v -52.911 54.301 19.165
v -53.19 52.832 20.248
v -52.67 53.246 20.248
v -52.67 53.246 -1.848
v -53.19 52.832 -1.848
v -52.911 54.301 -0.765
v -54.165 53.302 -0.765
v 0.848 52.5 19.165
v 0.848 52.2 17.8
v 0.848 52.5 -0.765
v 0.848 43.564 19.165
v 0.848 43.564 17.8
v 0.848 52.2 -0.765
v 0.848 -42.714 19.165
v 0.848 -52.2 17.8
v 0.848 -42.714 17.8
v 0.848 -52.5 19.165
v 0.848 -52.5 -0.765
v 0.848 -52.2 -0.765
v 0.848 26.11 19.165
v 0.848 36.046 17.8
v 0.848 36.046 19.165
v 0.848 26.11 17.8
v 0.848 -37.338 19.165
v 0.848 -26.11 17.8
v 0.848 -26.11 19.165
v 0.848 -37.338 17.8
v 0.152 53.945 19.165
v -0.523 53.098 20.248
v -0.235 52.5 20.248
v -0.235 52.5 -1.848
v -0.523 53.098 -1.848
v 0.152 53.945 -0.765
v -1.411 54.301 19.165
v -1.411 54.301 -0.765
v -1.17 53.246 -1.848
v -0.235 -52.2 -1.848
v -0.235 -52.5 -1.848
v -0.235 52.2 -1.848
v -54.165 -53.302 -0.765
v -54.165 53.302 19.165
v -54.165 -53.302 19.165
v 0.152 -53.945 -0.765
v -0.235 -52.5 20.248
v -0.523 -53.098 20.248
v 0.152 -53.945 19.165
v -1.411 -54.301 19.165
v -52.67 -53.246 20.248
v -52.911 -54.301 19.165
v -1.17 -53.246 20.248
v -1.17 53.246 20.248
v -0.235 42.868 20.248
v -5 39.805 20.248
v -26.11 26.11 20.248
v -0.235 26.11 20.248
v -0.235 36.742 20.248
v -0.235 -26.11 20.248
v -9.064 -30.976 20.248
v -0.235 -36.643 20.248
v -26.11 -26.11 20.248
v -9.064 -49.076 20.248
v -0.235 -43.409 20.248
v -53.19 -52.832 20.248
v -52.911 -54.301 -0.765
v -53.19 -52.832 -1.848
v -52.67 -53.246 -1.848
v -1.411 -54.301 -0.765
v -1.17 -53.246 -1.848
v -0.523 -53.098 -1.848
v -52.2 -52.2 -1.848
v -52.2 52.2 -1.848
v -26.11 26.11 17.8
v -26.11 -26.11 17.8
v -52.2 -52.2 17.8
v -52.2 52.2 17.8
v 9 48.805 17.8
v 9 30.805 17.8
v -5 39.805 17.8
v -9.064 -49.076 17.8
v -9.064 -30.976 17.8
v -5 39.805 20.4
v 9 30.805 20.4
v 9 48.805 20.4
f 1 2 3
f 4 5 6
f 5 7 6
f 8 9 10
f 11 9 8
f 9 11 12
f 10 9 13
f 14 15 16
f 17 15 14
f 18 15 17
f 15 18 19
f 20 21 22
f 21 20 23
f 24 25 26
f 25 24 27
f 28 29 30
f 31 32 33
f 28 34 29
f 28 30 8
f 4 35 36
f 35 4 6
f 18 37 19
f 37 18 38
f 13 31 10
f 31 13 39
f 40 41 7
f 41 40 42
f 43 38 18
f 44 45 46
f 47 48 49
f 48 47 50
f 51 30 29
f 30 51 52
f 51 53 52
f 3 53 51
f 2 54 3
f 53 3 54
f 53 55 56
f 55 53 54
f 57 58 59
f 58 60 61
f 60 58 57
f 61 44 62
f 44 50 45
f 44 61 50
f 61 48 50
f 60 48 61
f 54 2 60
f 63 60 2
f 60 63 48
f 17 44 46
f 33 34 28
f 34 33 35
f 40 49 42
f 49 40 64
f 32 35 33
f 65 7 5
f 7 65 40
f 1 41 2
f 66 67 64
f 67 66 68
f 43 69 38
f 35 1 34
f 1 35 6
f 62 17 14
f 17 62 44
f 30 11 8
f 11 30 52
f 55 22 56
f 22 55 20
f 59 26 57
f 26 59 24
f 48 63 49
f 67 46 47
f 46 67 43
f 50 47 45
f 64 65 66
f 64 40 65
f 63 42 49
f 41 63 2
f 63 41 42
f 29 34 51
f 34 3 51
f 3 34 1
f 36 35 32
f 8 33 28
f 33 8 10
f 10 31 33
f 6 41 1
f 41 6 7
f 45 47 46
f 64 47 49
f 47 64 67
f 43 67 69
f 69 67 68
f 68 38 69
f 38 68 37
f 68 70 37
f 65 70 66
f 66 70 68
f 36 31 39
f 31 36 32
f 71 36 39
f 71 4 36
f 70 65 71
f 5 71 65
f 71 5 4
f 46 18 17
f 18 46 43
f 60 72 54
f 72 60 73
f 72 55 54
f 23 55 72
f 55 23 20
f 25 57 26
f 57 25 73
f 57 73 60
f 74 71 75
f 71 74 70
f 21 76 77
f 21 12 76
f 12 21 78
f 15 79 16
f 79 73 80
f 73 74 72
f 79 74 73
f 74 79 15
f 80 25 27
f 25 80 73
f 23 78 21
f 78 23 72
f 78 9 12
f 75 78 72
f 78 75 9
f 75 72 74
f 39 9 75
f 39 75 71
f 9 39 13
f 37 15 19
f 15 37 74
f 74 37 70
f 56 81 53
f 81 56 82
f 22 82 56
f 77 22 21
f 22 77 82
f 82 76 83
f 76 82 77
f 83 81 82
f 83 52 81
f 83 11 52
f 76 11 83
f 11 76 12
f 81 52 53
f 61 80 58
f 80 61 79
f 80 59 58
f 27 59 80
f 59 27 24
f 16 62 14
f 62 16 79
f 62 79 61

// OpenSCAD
// This is a complete rewrite.  This time, going for rounded edges!
// This may not be right!  Does the minkowki make it bigger by 2*minkValue()
// My measurements are in mm
minkValue=2;
Outer=109-minkValue;
Height=22.4-minkValue;
CenterSquare=52.22;
CenterSquareHeight=Height+0.2; //slightly taller
WallThickness=2.6;
InternalVoid=Outer-WallThickness;
InternalVoidHeight=Height-WallThickness;

module outerShell(){
                // Outer shell is
    minkowski() {
                translate([-(Outer/4),0]) 
                linear_extrude(height=Height-(minkValue)) 
                square([(Outer/2-(minkValue)),Outer-(minkValue)], center=true);
                sphere(minkValue);
    }
}
module centerPost() {
                // Post, centered
                linear_extrude(height=CenterSquareHeight)
                    square(CenterSquare, center=true);
}
module innerHollow() {
                // The inside is hollow
    translate([0,0,-minkValue])
            linear_extrude(height=InternalVoidHeight+minkValue)
                square(InternalVoid, center=true);
}
// This is just a triangular prism
// I'm going by feel, on this one!
// It would fit in a rectangle with these dimensions:
dogEarX=14; // These values should be calculated from Outer (?)
dogEarY=18;
dogEarYPos=((CenterSquare/2 + (Outer/2-CenterSquare/2)/2)); // Center of arm
module dogEar() {
    linear_extrude(height=WallThickness) 
    polygon([[0,0], [dogEarX,-(dogEarY/2)], [dogEarX,(dogEarY/2)]]);
}
clearance=0.1; // a "fudge-factor" for 3D printing, letting parts fit
dogEarStrength=5; // how deep to bury the dogEars
difference() {
    union() {
        difference() {
            difference() {
                outerShell();
                centerPost();
            }
            innerHollow();
        }      
        translate([-dogEarStrength, dogEarYPos, (Height-WallThickness)])
        dogEar(); // add the dogEar, in the right place
    }   
    resize([(dogEarX+clearance),(dogEarY+clearance)])
    translate([dogEarStrength, -dogEarYPos, (Height-WallThickness)])
    rotate([0,0,180])    
    dogEar();  // subtract the dogEar, in the right place, bigger!
}
